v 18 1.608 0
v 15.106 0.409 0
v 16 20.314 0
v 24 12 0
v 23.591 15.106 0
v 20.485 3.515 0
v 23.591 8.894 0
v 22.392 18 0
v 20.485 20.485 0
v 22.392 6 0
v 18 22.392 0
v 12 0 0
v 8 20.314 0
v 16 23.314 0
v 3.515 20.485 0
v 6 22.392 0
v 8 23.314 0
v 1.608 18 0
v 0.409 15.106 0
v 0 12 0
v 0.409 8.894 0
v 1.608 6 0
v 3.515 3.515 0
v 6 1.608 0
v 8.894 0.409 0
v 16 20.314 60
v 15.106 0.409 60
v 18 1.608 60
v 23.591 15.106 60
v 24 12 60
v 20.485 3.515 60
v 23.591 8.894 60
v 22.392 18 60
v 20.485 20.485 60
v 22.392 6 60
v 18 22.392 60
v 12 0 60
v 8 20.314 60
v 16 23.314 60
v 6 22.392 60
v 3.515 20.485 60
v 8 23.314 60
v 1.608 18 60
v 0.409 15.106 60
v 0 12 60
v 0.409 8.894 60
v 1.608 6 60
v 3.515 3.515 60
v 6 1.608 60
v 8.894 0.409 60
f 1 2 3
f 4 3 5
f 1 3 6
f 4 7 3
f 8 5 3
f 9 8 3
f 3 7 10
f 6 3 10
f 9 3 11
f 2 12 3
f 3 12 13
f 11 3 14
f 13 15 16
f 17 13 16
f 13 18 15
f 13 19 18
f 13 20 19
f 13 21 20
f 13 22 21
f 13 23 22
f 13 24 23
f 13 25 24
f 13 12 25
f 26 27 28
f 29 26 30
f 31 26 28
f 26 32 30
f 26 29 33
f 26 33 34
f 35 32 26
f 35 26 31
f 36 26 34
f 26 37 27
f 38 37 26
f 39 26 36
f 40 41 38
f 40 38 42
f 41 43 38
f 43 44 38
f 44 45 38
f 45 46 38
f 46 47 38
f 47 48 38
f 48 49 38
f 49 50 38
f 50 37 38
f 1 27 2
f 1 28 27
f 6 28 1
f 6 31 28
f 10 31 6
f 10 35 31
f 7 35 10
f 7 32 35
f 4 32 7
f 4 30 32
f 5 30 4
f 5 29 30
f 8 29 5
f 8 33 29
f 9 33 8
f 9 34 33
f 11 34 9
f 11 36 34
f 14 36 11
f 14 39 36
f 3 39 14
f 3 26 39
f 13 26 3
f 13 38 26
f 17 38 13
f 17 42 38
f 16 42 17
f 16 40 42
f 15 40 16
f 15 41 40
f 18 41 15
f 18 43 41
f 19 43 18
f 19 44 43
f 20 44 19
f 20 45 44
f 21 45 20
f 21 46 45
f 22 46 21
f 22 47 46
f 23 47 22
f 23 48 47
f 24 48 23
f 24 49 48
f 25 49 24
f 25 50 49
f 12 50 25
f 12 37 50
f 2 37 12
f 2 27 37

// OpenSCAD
$fn = 32;

// ----------------------------------------------------------------------
// Keyway shaft: d24 shaft, key 8 x 3 mm
// ----------------------------------------------------------------------

// --- parameters (mm) ---
shaft_r = 12;             // shaft radius
key_w = 8;                // keyway width
key_d = 3;                // keyway depth below the surface line
plate_t = 60;             // shaft length, Z (extrusion height)

shaft_d = 2 * shaft_r;  // shaft diameter
circle_step = 15;  // polygon sampling step, degrees

profile = [[6, 22.392], [3.515, 20.485], [1.608, 18], [0.409, 15.106], [0, 12], [0.409, 8.894], [1.608, 6], [3.515, 3.515], [6, 1.608], [8.894, 0.409], [12, 0], [15.106, 0.409], [18, 1.608], [20.485, 3.515], [22.392, 6], [23.591, 8.894], [24, 12], [23.591, 15.106], [22.392, 18], [20.485, 20.485], [18, 22.392], [16, 23.314], [16, 20.314], [8, 20.314], [8, 23.314]];  // primary outline, 25 points, counter clockwise

// --- the one profile operation ---
linear_extrude(height = plate_t) polygon(points = profile);
